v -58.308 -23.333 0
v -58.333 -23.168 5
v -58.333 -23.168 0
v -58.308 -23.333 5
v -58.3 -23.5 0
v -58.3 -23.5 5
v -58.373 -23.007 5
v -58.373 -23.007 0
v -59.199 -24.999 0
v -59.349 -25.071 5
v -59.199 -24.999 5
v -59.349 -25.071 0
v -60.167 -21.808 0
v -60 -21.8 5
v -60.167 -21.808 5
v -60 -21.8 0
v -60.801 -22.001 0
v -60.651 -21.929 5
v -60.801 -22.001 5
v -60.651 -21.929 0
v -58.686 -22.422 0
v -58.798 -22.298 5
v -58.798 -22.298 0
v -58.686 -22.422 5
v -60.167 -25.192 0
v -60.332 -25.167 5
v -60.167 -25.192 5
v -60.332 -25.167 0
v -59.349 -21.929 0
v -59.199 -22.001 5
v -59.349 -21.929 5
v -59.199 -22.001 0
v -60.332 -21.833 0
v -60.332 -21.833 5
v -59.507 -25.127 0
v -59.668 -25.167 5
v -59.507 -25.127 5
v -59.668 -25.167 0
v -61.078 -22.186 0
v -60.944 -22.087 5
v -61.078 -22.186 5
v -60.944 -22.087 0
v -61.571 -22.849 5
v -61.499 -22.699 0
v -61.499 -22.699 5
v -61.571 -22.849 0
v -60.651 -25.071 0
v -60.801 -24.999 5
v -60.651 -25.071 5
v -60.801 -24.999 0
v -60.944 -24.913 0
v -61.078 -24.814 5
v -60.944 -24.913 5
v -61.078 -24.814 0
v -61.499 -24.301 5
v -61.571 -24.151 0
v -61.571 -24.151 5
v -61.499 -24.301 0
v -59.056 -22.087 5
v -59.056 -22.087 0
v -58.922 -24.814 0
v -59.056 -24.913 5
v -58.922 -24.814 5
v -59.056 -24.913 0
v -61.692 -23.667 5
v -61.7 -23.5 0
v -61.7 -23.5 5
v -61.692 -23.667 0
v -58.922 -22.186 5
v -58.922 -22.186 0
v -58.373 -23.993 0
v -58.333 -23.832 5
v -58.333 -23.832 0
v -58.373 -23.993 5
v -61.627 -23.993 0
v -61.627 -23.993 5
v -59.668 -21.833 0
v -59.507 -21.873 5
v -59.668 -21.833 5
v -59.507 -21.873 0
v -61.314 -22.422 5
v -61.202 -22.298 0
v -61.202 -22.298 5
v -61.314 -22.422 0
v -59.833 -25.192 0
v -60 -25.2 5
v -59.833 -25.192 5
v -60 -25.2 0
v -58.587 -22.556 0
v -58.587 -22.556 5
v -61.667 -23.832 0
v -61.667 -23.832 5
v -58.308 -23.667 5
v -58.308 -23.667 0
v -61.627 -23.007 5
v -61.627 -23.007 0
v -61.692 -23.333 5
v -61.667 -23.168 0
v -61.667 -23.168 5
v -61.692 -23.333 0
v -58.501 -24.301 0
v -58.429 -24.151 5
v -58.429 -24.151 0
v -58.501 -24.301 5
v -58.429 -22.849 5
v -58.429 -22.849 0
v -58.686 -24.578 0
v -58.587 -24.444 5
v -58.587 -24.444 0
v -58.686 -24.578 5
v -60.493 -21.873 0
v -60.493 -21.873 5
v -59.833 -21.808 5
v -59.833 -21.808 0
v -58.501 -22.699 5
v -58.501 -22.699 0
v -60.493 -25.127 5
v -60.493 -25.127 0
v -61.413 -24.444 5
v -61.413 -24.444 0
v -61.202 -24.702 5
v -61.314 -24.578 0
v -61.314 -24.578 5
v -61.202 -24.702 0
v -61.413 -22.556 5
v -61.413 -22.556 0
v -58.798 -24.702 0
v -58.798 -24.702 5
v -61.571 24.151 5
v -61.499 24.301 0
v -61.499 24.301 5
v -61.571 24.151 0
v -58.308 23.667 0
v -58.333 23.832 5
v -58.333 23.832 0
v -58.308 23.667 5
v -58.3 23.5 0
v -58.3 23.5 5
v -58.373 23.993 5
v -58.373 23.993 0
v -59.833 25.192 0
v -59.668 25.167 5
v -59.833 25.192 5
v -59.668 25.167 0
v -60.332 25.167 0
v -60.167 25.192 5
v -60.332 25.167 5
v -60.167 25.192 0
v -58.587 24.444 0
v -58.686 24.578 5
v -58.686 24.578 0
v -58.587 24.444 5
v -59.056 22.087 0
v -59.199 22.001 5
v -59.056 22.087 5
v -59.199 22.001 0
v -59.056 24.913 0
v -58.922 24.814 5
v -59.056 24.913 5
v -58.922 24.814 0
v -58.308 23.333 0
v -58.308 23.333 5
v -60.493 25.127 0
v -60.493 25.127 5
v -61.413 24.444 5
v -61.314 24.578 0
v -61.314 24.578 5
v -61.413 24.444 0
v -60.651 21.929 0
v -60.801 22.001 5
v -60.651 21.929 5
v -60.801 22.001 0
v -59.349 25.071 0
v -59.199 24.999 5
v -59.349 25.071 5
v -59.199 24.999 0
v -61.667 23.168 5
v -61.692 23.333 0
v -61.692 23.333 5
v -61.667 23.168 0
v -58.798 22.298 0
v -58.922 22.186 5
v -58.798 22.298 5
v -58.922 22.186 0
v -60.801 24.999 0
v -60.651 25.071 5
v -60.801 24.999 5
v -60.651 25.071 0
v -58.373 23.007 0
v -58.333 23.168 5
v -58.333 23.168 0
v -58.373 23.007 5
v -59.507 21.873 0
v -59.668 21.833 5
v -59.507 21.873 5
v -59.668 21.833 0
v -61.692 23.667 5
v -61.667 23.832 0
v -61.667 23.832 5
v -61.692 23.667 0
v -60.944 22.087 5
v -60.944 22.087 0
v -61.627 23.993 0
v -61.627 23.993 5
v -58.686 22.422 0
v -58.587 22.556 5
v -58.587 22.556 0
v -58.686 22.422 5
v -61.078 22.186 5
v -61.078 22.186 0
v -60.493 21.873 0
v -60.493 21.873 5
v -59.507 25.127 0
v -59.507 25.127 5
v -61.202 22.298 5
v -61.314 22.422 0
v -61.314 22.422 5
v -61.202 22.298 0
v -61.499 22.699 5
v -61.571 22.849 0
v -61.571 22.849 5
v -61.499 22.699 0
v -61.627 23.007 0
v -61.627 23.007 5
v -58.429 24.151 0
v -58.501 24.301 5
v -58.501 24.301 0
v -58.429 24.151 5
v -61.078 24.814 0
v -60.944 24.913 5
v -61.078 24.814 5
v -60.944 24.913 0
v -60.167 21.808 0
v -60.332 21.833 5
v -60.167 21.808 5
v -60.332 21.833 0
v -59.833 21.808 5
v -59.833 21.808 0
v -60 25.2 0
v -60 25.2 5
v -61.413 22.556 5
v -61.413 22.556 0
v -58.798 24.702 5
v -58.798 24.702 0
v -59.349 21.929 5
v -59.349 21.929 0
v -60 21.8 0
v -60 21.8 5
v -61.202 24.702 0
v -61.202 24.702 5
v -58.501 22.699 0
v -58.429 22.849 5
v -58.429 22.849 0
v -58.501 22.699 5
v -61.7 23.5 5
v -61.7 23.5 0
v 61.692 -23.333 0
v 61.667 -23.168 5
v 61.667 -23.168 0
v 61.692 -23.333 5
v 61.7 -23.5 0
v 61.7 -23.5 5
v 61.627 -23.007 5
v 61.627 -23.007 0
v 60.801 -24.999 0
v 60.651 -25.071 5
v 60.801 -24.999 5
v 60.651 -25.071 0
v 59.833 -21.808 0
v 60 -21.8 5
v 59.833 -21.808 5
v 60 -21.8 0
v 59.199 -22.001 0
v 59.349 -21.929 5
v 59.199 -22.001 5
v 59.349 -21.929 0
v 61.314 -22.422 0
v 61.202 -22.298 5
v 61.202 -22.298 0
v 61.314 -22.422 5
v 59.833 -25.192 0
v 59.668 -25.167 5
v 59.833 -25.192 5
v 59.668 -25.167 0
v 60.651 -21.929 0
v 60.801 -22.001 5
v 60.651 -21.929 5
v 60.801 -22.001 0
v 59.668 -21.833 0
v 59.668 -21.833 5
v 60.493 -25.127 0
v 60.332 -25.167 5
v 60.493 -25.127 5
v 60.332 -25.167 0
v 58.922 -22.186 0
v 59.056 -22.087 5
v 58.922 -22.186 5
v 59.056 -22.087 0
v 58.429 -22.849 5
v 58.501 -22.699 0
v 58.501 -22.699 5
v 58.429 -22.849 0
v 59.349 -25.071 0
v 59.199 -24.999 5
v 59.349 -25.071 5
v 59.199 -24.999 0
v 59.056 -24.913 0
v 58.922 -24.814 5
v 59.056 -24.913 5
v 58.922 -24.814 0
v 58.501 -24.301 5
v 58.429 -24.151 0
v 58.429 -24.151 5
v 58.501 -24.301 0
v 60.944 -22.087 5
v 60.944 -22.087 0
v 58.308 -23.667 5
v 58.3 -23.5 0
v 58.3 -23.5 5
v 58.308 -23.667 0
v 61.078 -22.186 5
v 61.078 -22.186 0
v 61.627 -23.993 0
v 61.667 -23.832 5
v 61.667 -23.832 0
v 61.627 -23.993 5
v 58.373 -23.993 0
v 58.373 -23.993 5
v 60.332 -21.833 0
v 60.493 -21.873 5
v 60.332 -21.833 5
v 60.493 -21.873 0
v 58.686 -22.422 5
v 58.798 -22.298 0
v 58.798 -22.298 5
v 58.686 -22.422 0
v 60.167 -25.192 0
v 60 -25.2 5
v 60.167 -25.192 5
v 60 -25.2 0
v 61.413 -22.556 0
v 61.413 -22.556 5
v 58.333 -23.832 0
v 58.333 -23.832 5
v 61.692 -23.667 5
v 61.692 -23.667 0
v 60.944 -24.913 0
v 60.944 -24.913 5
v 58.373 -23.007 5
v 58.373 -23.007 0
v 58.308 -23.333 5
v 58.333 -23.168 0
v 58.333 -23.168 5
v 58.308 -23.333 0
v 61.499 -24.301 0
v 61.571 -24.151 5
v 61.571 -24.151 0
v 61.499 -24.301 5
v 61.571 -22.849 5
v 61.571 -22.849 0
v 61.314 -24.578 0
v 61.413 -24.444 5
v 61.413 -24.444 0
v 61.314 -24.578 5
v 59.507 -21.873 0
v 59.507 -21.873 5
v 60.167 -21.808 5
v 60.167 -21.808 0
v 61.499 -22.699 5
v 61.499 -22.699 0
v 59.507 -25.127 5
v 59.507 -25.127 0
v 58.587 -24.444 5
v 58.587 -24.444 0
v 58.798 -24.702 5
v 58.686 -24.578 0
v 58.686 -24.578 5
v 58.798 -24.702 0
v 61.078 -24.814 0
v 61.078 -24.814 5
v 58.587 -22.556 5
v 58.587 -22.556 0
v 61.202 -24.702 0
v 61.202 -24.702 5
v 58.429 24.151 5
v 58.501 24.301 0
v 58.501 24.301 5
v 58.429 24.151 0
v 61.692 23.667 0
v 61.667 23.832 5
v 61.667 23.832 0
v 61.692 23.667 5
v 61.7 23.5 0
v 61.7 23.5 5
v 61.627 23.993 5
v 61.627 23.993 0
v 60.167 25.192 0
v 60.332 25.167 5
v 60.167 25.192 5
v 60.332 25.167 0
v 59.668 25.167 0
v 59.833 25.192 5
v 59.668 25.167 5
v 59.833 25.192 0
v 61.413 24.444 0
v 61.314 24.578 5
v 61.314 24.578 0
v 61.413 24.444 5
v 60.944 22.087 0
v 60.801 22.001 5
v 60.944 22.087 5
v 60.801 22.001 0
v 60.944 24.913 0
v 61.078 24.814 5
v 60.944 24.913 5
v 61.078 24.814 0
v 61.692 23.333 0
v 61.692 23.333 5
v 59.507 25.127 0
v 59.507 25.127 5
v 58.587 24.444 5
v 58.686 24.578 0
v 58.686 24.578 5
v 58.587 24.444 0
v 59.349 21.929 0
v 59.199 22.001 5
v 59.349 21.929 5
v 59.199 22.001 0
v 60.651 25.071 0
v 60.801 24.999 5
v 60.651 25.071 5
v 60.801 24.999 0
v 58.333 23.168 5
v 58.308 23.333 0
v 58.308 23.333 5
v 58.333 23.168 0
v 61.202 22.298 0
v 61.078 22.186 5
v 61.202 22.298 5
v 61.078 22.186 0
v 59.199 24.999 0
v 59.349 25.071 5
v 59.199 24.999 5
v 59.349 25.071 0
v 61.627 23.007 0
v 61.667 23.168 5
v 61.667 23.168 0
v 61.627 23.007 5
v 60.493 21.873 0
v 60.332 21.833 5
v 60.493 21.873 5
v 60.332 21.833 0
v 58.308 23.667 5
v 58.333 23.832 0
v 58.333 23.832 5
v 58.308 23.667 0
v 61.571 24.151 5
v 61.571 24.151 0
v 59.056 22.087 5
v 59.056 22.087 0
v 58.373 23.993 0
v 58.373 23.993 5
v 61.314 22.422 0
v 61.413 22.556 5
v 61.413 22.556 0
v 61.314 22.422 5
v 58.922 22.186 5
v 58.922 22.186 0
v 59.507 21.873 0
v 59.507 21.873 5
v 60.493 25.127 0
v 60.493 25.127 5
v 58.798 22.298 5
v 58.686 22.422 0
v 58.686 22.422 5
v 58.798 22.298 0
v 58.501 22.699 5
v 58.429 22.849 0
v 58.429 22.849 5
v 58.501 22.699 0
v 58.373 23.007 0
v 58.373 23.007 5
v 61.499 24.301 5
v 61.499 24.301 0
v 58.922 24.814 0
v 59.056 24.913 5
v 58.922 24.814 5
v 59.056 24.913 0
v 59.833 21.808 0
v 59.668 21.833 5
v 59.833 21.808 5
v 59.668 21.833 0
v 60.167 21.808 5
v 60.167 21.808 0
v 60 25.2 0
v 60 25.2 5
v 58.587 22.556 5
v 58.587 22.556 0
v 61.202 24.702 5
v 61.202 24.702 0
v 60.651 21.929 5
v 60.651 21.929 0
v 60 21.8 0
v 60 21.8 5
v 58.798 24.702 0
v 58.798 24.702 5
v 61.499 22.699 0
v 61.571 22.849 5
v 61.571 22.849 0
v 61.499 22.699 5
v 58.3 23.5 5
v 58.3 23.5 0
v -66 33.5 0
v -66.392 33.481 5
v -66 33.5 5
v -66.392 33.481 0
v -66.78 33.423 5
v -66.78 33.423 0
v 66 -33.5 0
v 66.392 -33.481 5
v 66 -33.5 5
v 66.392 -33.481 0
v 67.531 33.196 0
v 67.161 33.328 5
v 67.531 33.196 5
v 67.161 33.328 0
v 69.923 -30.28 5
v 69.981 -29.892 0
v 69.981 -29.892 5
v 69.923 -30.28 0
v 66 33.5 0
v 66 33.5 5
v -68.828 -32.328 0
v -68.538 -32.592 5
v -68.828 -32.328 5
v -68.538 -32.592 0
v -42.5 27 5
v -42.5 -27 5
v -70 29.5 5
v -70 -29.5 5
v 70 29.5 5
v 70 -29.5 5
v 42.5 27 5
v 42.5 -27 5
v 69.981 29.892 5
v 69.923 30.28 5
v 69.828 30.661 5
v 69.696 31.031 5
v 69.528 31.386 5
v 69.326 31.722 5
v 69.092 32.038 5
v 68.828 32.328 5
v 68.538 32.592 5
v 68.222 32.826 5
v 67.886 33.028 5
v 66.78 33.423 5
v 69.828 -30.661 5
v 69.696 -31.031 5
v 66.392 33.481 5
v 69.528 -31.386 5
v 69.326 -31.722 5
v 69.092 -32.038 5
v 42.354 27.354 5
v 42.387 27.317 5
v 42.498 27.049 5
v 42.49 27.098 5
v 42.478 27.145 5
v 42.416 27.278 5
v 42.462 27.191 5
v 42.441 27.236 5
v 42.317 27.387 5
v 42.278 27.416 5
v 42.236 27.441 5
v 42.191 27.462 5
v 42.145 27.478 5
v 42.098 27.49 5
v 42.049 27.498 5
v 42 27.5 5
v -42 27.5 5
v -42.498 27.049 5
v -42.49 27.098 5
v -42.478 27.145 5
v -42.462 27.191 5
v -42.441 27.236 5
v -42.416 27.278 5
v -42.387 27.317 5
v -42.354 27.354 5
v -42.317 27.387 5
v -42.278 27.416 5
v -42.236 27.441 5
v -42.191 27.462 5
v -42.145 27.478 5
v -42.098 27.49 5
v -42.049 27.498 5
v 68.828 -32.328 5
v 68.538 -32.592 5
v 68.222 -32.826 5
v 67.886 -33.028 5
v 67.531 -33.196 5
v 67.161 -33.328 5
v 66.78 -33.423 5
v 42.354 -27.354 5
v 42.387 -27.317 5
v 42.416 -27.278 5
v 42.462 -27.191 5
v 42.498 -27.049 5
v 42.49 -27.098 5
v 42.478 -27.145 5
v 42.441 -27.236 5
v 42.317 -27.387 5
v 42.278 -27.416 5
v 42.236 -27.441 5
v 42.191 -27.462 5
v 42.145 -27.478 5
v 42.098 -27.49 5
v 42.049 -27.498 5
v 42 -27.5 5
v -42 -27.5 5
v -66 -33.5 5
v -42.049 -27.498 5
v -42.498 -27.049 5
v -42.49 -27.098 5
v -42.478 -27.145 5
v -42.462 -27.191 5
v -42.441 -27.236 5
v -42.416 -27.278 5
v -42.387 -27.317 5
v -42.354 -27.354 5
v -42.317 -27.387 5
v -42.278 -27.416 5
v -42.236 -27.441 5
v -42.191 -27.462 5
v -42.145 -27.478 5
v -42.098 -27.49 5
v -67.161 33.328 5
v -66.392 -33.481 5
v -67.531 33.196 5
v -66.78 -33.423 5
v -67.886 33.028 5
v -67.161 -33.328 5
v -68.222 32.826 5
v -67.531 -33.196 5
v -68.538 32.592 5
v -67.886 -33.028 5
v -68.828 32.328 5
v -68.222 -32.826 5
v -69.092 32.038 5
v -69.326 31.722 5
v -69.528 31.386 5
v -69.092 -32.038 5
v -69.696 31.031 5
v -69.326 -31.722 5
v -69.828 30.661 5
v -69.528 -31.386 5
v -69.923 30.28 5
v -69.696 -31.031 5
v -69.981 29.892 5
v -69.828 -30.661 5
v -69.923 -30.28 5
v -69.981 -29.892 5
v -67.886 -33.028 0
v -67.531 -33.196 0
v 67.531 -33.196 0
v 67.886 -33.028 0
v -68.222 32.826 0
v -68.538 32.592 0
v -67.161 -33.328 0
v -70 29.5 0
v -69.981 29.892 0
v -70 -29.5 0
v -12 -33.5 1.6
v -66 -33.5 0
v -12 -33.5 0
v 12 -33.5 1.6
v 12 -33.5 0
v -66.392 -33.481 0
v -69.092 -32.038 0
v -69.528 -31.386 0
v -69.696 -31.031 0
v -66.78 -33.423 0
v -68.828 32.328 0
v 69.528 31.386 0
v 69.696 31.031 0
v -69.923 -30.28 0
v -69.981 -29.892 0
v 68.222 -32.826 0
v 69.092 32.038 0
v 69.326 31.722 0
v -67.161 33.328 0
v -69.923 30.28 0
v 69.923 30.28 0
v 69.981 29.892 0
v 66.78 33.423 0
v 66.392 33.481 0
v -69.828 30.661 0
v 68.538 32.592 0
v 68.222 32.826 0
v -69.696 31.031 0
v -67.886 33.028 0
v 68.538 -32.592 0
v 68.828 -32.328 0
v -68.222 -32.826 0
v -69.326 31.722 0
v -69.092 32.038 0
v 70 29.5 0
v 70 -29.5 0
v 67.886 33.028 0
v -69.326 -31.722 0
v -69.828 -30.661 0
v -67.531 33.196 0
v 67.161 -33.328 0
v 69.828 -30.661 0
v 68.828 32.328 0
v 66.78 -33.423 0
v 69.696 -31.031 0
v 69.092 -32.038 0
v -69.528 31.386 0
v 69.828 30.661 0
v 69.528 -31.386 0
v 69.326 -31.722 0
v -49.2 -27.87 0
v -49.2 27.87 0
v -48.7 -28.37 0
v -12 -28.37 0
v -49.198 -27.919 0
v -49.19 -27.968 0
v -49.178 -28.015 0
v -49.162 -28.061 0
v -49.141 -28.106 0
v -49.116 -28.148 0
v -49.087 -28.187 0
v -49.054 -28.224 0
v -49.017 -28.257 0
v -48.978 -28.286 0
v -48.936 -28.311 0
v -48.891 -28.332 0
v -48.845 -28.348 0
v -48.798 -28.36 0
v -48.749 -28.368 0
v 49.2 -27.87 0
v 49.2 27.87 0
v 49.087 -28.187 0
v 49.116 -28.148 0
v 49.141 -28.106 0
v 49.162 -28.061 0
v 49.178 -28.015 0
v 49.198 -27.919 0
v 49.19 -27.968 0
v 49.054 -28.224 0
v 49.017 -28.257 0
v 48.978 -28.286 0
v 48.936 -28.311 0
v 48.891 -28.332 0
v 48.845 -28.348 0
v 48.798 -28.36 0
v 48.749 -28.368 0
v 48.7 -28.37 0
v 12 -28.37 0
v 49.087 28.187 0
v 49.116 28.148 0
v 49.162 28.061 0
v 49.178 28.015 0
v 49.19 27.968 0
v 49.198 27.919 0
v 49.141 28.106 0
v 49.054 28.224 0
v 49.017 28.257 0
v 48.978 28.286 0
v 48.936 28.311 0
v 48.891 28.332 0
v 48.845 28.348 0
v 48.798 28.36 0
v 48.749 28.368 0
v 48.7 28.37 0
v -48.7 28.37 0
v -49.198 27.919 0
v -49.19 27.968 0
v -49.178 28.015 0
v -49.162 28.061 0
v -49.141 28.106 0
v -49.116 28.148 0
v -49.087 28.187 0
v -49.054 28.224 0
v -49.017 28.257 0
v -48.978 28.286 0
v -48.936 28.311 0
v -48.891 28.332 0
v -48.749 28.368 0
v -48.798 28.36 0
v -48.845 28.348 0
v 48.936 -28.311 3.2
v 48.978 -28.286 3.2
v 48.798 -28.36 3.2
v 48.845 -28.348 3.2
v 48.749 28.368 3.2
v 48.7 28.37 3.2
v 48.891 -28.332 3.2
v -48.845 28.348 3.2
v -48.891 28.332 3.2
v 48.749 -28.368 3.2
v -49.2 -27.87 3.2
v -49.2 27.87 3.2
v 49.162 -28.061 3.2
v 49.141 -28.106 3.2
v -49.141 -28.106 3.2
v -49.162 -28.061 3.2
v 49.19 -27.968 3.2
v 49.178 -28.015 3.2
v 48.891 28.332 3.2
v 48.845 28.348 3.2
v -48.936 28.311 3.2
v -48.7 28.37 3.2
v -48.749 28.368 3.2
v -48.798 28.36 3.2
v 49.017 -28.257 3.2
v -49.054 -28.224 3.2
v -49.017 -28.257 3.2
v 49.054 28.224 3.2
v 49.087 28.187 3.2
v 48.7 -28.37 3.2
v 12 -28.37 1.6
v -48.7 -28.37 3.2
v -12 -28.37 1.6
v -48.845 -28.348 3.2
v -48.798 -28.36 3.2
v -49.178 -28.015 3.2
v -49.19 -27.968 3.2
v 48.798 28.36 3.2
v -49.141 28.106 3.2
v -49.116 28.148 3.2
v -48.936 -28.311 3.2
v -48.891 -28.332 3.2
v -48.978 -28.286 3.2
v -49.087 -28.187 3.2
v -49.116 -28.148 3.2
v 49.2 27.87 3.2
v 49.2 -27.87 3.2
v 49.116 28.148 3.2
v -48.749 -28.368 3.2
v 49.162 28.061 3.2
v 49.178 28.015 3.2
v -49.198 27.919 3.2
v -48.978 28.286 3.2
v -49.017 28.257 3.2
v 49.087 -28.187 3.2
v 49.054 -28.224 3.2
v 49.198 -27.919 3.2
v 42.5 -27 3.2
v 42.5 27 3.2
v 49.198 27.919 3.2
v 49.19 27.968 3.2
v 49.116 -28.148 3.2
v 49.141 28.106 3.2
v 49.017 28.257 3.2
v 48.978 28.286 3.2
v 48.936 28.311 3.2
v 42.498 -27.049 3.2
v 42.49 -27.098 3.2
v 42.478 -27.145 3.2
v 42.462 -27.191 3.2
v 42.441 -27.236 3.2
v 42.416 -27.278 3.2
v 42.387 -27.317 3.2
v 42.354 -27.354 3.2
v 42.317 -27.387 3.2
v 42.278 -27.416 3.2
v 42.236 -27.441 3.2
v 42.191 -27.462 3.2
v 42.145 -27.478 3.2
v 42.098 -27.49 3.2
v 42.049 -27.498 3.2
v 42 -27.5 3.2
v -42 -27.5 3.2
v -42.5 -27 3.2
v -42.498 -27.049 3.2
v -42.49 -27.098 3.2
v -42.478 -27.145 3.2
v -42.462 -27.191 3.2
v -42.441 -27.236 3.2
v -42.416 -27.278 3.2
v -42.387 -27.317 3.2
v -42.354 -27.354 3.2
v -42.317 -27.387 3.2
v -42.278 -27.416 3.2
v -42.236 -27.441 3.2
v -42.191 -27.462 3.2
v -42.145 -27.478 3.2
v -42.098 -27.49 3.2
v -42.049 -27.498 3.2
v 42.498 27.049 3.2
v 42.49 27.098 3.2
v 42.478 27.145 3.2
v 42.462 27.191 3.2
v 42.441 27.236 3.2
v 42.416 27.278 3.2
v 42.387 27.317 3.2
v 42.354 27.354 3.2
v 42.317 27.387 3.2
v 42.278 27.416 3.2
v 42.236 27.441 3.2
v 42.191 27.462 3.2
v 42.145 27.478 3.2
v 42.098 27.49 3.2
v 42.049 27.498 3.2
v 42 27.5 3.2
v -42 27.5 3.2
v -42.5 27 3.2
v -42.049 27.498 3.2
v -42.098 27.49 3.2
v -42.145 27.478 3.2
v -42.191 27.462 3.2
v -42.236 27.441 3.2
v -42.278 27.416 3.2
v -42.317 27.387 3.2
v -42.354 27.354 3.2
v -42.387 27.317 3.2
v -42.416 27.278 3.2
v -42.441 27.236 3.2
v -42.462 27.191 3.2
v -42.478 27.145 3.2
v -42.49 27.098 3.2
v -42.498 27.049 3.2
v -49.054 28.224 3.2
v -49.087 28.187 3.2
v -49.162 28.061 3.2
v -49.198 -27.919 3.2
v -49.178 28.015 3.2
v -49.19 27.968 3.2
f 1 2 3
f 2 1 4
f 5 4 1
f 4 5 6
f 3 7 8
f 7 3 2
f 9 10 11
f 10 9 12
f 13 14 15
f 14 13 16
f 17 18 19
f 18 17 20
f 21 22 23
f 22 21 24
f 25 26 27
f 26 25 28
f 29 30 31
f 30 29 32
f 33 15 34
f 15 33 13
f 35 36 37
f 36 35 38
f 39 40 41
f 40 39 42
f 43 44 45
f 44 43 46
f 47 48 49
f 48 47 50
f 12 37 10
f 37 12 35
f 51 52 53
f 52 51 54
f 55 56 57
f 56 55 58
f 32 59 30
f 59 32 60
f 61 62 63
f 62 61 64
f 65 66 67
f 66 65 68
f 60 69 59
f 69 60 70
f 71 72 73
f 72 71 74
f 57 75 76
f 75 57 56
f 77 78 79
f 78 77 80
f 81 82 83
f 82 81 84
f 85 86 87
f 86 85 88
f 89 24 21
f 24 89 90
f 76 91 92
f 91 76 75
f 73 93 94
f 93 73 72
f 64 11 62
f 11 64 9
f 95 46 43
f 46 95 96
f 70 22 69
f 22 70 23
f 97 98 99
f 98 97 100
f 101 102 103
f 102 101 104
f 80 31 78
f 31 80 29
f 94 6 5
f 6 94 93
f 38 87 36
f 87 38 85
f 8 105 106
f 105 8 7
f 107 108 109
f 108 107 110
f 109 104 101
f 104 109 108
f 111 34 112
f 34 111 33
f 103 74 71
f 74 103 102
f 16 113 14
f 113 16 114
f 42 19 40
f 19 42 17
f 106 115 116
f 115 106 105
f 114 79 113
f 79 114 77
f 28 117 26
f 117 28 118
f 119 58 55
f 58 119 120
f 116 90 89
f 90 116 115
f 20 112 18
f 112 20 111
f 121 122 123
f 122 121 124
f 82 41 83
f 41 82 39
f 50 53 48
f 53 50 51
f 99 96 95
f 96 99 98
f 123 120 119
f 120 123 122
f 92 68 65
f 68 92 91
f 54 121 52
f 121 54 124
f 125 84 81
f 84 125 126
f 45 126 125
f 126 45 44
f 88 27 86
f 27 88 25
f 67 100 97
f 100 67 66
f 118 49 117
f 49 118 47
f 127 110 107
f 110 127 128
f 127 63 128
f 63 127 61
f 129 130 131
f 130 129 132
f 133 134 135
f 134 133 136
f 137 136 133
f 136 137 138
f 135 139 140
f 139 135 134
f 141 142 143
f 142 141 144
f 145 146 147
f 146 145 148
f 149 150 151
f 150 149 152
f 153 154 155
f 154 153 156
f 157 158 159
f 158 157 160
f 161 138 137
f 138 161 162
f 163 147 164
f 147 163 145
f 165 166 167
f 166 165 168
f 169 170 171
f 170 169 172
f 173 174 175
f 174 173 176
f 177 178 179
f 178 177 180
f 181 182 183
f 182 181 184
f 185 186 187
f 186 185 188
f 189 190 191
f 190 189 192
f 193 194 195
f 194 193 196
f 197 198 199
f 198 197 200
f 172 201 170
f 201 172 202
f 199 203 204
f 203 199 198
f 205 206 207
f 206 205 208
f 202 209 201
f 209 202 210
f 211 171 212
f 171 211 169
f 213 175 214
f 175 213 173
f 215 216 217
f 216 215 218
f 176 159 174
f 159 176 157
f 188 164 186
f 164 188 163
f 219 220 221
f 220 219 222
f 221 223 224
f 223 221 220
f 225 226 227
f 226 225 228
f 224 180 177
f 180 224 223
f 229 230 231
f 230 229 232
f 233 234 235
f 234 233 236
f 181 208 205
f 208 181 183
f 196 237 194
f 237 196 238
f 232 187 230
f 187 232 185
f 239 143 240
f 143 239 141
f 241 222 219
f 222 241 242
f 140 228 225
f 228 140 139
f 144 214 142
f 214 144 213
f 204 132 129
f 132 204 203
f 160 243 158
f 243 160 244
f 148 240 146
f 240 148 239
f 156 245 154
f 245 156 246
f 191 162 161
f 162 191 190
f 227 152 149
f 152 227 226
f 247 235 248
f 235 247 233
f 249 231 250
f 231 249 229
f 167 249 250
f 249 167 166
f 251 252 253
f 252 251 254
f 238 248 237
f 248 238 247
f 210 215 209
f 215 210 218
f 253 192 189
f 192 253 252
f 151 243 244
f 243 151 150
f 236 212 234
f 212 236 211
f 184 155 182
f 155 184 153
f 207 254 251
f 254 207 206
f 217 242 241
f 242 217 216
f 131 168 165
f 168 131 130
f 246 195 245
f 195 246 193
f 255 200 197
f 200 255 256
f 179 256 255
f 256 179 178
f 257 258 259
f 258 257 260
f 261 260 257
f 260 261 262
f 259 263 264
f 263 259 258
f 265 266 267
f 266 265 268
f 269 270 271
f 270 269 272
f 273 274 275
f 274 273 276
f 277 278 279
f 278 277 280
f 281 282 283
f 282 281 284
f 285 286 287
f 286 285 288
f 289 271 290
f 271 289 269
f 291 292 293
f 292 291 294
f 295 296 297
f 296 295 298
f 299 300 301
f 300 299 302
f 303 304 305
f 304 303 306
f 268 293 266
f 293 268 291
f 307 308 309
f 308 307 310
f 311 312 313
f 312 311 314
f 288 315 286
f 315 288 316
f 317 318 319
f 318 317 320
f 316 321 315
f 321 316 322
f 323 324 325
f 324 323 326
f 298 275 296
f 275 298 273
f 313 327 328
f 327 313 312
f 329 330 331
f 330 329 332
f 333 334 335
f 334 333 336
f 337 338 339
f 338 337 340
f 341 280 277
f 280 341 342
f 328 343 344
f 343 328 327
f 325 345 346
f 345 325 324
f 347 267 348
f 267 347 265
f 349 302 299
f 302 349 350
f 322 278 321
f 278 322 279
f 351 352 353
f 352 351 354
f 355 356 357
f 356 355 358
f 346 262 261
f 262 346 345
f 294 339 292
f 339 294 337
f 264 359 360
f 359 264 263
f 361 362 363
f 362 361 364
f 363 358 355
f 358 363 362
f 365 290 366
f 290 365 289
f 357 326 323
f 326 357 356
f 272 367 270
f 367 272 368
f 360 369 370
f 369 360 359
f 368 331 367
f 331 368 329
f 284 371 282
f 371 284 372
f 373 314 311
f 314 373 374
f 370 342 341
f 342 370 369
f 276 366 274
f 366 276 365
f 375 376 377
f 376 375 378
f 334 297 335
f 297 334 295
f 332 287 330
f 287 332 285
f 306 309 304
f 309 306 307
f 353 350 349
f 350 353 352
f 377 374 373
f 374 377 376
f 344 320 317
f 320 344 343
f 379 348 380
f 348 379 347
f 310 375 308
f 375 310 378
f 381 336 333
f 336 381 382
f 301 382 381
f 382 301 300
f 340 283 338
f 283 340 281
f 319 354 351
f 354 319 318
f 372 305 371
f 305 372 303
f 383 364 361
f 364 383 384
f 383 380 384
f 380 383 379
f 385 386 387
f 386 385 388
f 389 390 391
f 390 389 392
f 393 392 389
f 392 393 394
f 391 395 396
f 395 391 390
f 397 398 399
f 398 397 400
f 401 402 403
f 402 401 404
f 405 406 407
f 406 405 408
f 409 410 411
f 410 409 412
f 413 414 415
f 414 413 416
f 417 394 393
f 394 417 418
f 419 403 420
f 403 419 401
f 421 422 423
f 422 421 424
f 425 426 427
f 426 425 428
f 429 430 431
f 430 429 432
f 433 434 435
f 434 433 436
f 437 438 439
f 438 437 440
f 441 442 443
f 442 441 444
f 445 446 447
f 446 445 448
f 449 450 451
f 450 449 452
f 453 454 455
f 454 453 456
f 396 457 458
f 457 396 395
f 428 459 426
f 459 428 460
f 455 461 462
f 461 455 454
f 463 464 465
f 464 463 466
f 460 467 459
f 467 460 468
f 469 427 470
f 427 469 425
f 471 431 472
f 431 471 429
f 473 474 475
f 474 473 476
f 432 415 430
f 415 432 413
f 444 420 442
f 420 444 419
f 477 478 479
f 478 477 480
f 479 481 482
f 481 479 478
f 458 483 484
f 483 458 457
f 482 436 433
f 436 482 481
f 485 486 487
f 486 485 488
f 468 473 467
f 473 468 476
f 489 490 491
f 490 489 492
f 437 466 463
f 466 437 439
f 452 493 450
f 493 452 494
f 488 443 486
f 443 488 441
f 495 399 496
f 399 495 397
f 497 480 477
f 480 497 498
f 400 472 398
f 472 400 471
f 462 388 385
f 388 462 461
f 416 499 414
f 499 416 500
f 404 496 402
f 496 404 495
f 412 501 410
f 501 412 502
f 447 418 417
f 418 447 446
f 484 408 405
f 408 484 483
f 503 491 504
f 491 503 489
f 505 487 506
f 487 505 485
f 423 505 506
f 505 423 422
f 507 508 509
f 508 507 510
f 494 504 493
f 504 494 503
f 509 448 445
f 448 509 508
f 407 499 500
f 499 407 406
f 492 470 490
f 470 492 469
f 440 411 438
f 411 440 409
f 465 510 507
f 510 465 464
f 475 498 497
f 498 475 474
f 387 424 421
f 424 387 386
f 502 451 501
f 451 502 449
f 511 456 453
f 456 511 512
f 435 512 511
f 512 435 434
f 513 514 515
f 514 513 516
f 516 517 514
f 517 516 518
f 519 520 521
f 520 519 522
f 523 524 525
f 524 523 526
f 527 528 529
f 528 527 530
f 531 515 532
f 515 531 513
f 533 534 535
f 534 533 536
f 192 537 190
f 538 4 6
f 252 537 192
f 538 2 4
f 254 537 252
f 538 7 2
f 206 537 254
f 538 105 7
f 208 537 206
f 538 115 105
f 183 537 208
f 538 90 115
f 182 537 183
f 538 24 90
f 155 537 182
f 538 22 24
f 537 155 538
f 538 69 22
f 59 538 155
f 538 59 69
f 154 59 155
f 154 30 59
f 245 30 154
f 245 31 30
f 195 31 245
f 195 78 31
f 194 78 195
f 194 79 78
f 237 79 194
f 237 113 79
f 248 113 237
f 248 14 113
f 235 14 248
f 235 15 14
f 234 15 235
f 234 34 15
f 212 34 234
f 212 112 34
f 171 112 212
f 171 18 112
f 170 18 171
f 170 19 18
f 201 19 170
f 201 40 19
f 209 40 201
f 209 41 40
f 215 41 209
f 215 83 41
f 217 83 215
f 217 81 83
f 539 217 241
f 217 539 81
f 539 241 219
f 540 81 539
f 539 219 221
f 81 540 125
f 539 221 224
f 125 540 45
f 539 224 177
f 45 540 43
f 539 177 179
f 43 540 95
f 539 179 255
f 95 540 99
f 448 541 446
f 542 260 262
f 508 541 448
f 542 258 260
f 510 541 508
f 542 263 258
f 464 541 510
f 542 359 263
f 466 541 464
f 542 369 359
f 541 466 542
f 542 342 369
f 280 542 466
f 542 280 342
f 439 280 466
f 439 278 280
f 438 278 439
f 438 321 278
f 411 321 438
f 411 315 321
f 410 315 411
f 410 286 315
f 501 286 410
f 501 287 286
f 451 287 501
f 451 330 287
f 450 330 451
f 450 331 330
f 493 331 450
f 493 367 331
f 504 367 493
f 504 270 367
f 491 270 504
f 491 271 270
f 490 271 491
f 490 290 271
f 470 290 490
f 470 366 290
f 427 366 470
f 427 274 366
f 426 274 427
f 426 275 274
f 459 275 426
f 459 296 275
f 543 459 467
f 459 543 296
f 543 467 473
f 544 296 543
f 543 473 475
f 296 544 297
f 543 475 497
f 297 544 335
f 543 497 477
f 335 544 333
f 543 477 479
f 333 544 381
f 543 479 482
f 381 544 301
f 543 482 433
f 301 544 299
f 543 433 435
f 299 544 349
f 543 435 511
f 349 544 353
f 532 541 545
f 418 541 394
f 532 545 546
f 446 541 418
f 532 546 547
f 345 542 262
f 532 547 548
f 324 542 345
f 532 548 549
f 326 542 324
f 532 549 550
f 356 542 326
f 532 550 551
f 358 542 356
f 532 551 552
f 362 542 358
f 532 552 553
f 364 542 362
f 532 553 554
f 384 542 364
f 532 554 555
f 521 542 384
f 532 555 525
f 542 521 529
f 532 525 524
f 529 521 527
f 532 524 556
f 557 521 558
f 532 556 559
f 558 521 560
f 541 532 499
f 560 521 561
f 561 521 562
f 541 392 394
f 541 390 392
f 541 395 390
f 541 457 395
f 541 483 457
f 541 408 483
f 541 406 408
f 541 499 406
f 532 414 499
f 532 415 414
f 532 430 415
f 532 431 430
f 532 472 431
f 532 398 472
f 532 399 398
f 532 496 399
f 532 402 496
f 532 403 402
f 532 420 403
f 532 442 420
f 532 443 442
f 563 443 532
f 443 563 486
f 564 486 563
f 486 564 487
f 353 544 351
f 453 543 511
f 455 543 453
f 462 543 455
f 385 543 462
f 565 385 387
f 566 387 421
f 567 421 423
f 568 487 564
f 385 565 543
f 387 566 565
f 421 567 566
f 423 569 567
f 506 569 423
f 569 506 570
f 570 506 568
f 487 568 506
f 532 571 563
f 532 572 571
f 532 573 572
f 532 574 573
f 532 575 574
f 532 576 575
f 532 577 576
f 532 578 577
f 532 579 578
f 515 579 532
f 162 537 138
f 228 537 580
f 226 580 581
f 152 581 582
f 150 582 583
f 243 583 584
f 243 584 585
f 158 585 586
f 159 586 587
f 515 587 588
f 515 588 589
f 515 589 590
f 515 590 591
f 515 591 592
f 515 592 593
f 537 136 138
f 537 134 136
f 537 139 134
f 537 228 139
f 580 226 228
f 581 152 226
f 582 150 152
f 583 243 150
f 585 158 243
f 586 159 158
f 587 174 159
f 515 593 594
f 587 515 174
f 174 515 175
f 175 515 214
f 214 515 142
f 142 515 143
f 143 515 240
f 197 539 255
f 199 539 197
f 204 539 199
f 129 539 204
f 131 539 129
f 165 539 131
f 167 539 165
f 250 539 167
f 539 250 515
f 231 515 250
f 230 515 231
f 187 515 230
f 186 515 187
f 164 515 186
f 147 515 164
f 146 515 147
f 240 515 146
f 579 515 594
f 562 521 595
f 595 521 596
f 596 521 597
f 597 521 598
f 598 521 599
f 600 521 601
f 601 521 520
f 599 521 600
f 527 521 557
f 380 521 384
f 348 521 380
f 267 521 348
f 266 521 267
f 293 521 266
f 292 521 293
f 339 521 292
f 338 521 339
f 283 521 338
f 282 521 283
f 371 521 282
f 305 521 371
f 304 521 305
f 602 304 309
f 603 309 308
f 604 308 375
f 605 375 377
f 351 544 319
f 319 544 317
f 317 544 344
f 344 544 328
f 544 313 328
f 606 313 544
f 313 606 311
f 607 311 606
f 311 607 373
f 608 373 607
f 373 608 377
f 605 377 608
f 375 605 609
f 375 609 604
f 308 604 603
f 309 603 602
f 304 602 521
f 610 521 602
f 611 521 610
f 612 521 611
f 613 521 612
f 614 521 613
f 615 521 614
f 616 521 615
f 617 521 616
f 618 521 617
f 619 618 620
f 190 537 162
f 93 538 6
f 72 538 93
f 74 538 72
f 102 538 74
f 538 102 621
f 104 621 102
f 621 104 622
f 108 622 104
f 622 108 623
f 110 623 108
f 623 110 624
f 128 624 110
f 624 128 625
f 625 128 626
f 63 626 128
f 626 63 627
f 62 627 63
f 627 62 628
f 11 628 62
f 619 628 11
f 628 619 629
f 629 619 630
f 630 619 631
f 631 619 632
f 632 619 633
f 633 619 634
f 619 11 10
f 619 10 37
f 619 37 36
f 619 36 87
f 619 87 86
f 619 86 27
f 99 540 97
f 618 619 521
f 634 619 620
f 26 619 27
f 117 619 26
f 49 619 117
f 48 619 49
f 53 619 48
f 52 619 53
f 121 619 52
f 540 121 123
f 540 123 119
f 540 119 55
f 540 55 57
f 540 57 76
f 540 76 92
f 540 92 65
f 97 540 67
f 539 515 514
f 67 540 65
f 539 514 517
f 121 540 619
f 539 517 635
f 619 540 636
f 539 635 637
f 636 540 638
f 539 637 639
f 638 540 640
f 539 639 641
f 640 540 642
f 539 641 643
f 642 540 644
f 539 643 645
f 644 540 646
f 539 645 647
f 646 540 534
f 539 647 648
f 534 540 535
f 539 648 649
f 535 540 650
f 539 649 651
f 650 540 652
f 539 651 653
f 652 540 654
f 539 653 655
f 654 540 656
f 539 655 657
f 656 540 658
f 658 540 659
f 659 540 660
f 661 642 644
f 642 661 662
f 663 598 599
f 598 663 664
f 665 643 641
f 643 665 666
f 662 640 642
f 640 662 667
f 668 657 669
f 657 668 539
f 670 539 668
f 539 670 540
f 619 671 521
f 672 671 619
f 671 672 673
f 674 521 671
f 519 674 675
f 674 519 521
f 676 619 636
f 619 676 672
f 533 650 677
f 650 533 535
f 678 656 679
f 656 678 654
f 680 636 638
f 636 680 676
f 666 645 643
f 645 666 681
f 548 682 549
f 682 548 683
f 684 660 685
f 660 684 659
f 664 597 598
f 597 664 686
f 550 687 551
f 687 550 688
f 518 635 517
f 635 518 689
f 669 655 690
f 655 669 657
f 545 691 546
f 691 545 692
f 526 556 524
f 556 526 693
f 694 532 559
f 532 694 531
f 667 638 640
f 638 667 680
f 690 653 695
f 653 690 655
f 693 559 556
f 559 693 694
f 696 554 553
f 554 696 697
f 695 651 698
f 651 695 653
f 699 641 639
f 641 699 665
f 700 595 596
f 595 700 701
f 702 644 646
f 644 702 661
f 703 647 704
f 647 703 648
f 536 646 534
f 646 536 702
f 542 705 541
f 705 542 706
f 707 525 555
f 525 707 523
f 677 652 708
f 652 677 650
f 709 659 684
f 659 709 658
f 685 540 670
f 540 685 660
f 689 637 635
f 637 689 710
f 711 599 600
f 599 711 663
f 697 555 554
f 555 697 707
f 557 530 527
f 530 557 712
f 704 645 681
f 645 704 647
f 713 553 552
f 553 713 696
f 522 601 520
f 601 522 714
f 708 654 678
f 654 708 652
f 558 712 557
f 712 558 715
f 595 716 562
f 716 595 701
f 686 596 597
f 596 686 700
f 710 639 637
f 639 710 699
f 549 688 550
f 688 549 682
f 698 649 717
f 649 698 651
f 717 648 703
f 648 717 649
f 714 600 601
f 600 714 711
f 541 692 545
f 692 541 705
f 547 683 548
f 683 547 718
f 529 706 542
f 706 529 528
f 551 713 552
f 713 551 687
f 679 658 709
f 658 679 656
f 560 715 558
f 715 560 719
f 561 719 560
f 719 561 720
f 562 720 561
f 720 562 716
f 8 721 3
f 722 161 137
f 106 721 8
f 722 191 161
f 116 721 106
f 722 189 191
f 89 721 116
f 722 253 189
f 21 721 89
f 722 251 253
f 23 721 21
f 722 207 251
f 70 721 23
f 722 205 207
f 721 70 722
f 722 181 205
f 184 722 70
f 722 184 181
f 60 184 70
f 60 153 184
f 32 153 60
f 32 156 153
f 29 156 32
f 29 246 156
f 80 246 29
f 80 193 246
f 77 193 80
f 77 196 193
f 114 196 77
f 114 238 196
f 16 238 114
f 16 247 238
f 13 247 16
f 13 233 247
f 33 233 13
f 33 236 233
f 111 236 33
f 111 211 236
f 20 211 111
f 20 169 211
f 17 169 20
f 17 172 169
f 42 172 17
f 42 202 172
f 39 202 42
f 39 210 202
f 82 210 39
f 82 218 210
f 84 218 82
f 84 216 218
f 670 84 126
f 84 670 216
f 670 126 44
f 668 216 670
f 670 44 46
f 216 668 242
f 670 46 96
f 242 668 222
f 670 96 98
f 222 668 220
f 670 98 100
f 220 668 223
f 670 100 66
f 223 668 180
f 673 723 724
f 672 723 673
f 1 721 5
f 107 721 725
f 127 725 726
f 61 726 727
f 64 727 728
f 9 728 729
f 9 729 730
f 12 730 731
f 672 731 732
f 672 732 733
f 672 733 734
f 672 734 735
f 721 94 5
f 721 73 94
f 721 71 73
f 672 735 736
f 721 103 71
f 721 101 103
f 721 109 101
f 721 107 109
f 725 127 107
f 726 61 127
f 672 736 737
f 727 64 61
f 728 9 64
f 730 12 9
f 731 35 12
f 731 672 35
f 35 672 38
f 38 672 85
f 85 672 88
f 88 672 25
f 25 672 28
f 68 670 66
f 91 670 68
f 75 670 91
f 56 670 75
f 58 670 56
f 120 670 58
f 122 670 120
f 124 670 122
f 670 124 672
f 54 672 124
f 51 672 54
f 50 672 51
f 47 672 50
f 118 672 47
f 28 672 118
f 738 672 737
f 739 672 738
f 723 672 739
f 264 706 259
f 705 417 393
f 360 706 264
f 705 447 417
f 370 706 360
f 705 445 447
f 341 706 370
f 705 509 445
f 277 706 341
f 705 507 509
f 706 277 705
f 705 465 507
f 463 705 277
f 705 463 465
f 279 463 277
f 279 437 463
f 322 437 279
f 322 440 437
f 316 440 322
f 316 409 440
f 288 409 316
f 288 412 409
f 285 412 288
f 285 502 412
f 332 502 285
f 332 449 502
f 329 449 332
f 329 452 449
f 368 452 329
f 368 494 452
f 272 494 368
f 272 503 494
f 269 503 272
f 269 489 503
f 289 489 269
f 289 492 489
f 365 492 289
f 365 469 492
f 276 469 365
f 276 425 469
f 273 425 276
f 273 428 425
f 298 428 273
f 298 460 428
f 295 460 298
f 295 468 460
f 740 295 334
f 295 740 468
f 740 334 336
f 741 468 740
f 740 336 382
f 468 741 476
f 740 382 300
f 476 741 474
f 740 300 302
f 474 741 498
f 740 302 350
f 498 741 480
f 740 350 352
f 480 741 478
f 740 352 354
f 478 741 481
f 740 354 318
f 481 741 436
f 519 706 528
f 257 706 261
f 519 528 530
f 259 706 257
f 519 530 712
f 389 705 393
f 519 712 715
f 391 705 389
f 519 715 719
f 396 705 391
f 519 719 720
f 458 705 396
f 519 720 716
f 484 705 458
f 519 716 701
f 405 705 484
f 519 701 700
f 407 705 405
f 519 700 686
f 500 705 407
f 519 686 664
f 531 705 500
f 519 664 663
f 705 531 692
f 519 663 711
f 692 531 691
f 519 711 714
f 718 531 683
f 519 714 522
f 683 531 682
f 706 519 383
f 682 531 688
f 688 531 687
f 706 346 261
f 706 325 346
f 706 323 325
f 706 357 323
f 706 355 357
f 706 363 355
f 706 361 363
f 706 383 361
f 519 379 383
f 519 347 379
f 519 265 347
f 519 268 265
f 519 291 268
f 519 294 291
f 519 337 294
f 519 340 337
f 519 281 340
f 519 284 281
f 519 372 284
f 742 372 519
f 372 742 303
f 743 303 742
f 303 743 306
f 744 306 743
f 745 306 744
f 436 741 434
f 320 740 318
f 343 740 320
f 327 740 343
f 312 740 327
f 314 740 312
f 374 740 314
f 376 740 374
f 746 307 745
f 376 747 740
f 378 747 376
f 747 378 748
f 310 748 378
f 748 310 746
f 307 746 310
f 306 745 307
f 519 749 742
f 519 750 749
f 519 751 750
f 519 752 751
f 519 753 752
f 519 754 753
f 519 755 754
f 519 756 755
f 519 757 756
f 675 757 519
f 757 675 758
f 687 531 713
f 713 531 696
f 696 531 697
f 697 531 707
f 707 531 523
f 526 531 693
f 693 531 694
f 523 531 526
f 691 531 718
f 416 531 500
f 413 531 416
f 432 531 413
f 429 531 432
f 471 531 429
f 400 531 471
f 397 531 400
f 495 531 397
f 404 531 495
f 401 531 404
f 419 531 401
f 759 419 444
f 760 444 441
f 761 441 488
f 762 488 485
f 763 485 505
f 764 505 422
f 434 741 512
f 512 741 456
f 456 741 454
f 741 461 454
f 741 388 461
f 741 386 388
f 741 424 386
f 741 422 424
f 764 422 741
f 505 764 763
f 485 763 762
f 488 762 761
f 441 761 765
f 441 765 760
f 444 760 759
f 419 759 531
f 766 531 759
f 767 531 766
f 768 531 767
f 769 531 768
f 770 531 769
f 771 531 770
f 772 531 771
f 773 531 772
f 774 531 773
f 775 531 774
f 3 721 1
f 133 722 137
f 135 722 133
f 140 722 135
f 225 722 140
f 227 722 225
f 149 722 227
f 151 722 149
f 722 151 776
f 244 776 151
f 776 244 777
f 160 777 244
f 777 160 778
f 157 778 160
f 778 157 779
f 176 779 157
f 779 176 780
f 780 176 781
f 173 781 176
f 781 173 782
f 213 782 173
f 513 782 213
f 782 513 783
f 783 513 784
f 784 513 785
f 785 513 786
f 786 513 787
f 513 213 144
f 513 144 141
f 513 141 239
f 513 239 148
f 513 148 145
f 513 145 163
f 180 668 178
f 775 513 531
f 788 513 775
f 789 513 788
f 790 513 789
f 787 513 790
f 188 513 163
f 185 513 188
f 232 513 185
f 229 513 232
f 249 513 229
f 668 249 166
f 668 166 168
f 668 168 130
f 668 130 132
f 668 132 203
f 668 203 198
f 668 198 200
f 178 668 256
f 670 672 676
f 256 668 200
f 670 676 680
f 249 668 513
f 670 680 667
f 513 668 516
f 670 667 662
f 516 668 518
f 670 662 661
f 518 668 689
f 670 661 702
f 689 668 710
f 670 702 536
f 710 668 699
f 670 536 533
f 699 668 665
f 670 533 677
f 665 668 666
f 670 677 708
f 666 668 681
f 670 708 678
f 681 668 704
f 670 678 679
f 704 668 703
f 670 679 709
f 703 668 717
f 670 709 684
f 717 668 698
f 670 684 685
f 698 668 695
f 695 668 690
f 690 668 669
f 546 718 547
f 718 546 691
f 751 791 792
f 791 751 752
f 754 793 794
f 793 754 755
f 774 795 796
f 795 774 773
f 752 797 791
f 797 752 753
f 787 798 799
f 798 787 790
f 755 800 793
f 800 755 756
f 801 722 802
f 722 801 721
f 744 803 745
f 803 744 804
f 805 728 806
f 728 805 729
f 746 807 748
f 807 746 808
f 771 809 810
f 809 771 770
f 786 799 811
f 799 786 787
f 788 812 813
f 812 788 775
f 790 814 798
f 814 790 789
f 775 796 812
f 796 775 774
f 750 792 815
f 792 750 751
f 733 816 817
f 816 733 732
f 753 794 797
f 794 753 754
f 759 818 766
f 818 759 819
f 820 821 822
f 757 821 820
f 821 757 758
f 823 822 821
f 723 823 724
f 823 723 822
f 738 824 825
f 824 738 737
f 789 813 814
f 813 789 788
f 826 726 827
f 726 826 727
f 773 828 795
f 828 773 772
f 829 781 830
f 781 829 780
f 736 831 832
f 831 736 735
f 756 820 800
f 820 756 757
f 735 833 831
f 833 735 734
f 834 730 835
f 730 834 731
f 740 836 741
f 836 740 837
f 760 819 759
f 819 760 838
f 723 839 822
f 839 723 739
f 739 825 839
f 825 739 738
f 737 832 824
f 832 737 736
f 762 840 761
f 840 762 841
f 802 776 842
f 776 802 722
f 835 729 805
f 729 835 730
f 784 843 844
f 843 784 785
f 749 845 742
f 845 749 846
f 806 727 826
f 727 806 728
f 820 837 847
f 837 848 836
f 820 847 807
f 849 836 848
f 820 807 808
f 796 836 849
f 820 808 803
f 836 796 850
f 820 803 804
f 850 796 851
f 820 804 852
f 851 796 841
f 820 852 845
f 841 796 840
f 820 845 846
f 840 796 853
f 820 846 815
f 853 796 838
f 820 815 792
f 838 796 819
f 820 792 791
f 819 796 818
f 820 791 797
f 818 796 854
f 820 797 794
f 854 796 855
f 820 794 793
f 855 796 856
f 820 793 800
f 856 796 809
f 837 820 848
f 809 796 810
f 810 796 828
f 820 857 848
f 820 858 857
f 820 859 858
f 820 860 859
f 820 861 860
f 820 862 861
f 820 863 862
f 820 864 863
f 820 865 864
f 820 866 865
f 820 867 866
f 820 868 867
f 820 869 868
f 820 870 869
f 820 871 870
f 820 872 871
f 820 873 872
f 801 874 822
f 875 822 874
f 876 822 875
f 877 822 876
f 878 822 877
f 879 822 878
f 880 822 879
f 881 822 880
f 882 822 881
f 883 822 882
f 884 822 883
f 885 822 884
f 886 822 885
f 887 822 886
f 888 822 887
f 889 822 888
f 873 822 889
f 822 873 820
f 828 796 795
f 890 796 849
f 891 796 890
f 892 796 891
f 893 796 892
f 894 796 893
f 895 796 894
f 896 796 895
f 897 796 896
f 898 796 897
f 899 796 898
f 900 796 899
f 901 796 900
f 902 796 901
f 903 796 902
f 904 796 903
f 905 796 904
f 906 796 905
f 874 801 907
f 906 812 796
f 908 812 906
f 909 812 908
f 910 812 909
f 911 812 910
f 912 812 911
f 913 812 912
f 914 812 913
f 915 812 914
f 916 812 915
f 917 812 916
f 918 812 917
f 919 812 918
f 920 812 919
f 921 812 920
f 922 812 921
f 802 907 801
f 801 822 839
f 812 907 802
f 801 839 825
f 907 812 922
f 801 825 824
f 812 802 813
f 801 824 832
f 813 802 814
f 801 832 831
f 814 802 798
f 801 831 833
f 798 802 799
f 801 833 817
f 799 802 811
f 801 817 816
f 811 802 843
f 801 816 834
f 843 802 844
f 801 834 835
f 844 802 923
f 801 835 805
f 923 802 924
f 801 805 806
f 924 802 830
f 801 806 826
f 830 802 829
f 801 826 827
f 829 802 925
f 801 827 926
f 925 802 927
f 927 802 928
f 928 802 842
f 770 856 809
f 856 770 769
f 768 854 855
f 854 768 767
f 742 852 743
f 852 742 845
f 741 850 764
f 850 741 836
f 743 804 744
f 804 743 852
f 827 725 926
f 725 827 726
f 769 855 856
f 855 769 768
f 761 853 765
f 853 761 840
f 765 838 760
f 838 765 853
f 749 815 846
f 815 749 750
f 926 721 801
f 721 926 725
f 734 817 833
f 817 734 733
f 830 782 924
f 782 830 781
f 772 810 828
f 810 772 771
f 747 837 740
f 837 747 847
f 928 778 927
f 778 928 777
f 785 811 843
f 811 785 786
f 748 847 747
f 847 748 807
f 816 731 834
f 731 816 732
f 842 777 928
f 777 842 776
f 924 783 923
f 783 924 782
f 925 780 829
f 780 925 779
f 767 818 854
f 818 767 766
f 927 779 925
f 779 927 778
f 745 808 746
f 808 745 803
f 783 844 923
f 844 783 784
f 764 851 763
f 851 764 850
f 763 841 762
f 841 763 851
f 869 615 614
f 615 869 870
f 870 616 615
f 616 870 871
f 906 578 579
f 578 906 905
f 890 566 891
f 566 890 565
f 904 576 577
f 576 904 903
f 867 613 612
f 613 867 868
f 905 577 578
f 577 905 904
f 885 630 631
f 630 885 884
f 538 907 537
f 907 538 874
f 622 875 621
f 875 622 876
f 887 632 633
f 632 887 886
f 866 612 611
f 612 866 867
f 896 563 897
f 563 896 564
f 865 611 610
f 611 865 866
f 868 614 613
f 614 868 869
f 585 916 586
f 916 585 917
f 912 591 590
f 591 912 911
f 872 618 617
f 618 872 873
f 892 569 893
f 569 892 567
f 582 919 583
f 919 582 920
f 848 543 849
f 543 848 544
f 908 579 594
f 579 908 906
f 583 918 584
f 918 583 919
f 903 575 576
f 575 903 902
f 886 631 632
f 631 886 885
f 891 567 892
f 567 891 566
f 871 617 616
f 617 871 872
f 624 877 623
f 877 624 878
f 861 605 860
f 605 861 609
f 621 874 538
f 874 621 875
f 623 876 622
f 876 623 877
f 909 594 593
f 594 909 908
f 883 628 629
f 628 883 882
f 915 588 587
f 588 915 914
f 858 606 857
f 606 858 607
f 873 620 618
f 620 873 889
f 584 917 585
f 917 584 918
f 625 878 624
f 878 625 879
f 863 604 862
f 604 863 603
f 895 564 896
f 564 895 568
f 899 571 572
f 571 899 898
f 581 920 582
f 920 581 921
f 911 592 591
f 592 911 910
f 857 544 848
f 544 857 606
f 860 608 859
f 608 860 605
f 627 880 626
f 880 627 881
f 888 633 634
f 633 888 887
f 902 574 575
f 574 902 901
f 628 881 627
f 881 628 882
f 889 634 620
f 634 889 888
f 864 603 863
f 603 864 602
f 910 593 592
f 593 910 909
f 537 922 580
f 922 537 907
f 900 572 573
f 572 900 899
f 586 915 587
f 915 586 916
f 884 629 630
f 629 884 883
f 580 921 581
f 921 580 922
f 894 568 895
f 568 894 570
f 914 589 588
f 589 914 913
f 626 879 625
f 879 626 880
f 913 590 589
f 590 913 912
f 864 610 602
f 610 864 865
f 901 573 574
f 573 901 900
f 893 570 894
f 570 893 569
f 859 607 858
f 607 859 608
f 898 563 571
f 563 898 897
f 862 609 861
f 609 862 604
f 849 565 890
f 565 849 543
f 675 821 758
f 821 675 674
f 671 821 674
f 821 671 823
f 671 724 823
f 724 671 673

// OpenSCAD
// =============================================================
// porch-tft-adapter.scad — ILI9488 3.5" TFT bezel / cradle plate
// =============================================================
// KNOWN ISSUES (deferred) — see printed-parts-issues.md #2:
//   - enlarge display opening ~0.5 mm; deepen pocket ~10 mm to seat the
//     pin header (avoids cutting a slot). Not yet applied.
// =============================================================
// Full-width faceplate for the 45° porch face (140 mm wide).
// Mounts with 4× M3 screws — all four are NEW holes; use this
// plate as a drilling template:
//
//   1. Hold plate flush against porch face, centred, tape/clamp.
//   2. Mark all four bore centres with an awl.
//   3. Remove plate and drill Ø3.4 mm through the porch wall.
//   4. Fasten with M3 screws + hex/nyloc nuts inside the cavity.
//
// Holes are symmetric, 10 mm in from every edge:
//   X = ±60 mm  (140/2 − 10),  Y = ±23.5 mm  (67/2 − 10).
// Plain through-bores — NOT countersunk (pan/button-head screws).
//
// The TFT PCB sits in a shallow rear pocket; the front bezel window
// exposes the active area.  No header pocket — header desoldered;
// wires hand-soldered to PCB pads and exit through a notch at the
// low-Y (down-slope) edge.
//
// ── Coordinate frame (plate lies flat on print bed) ────────────
//   X  = face width  (horizontal when mounted on porch)
//   Y  = up-slope    (when mounted on porch)
//   Z  = outward normal (Z=0 inner/back face; Z=plate_t bezel face)
//
// Print: PETG, 4 walls, 20 % gyroid infill, FRONT FACE DOWN on bed.
//
// Cover note: the plate fully covers the old OLED window (26×14 mm),
// button hole (Ø16.2 mm), and LED hole (Ø5 mm) — no patching needed.
// =============================================================

$fn = 64;
eps = 0.01;

// ── Plate dimensions ───────────────────────────────────────────
plate_x  = 140;   // face width (spans full porch face)
plate_y  = 67;    // slope extent
plate_t  = 5.0;   // total thickness
corner_r = 4;

// ── Display opening (front bezel window) ────────────────────────
win_x = 85;   // opening width
win_y = 55;   // opening height

// ── Mounting holes ─────────────────────────────────────────────
// 10 mm in from each edge, symmetric about plate centre.
hole_inset  = 10;
hole_x_half = plate_x / 2 - hole_inset;   // = 60.0 mm
hole_y_half = plate_y / 2 - hole_inset;   // = 23.5 mm
m3_cl_d     = 3.4;   // clearance bore Ø (plain through-hole, no countersink)

// ── ILI9488 TFT — MSP3520-type PCB, landscape ──────────────────
tft_pcb_x = 98.00;   // PCB width  (X, face-width direction)
tft_pcb_y = 56.34;   // PCB height (Y, slope direction)

// PCB cradle pocket: PCB + 0.4 mm assembly clearance; 3.2 mm deep
pocket_clr = 0.4;
pocket_x   = tft_pcb_x + pocket_clr;     // 98.4 mm  (±49.2 from centre)
pocket_y   = tft_pcb_y + pocket_clr;     // 56.74 mm
pocket_d   = 3.2;   // depth from back face (1.8 mm solid lip remains)

// ── Wire exit notch (low-Y edge) ───────────────────────────────
wire_notch_x = 24;   // width — clears ~8 leads at 3 mm pitch
wire_notch_y = 10;   // inward reach from plate edge

// =============================================================
module adapter() {
    difference() {

        // ── Plate body ─────────────────────────────────────────
        linear_extrude(plate_t)
            offset(corner_r) offset(-corner_r)
                square([plate_x, plate_y], center = true);

        // ── TFT PCB cradle pocket (opens at back face, Z = 0) ──
        translate([0, 0, -eps])
            linear_extrude(pocket_d + eps)
                offset(0.5) offset(-0.5)
                    square([pocket_x, pocket_y], center = true);

        // ── Bezel window (opens at front face, Z = plate_t) ────
        translate([0, 0, plate_t - pocket_d])
            linear_extrude(pocket_d + 2 * eps)
                offset(0.5) offset(-0.5)
                    square([win_x, win_y], center = true);

        // ── Wire exit notch at low-Y (down-slope) edge ─────────
        translate([0,
                   -(plate_y / 2 - wire_notch_y / 2 + eps),
                   -eps])
            cube([wire_notch_x, wire_notch_y + 2 * eps, pocket_d + 2 * eps],
                 center = true);

        // ── 4× M3 clearance holes — symmetric, 10 mm from edges ─
        // Plain through-bores; use plate as a drill template.
        for (sx = [-1, 1], sy = [-1, 1])
            translate([sx * hole_x_half, sy * hole_y_half, -eps])
                cylinder(d = m3_cl_d, h = plate_t + 2 * eps);
    }
}

adapter();
